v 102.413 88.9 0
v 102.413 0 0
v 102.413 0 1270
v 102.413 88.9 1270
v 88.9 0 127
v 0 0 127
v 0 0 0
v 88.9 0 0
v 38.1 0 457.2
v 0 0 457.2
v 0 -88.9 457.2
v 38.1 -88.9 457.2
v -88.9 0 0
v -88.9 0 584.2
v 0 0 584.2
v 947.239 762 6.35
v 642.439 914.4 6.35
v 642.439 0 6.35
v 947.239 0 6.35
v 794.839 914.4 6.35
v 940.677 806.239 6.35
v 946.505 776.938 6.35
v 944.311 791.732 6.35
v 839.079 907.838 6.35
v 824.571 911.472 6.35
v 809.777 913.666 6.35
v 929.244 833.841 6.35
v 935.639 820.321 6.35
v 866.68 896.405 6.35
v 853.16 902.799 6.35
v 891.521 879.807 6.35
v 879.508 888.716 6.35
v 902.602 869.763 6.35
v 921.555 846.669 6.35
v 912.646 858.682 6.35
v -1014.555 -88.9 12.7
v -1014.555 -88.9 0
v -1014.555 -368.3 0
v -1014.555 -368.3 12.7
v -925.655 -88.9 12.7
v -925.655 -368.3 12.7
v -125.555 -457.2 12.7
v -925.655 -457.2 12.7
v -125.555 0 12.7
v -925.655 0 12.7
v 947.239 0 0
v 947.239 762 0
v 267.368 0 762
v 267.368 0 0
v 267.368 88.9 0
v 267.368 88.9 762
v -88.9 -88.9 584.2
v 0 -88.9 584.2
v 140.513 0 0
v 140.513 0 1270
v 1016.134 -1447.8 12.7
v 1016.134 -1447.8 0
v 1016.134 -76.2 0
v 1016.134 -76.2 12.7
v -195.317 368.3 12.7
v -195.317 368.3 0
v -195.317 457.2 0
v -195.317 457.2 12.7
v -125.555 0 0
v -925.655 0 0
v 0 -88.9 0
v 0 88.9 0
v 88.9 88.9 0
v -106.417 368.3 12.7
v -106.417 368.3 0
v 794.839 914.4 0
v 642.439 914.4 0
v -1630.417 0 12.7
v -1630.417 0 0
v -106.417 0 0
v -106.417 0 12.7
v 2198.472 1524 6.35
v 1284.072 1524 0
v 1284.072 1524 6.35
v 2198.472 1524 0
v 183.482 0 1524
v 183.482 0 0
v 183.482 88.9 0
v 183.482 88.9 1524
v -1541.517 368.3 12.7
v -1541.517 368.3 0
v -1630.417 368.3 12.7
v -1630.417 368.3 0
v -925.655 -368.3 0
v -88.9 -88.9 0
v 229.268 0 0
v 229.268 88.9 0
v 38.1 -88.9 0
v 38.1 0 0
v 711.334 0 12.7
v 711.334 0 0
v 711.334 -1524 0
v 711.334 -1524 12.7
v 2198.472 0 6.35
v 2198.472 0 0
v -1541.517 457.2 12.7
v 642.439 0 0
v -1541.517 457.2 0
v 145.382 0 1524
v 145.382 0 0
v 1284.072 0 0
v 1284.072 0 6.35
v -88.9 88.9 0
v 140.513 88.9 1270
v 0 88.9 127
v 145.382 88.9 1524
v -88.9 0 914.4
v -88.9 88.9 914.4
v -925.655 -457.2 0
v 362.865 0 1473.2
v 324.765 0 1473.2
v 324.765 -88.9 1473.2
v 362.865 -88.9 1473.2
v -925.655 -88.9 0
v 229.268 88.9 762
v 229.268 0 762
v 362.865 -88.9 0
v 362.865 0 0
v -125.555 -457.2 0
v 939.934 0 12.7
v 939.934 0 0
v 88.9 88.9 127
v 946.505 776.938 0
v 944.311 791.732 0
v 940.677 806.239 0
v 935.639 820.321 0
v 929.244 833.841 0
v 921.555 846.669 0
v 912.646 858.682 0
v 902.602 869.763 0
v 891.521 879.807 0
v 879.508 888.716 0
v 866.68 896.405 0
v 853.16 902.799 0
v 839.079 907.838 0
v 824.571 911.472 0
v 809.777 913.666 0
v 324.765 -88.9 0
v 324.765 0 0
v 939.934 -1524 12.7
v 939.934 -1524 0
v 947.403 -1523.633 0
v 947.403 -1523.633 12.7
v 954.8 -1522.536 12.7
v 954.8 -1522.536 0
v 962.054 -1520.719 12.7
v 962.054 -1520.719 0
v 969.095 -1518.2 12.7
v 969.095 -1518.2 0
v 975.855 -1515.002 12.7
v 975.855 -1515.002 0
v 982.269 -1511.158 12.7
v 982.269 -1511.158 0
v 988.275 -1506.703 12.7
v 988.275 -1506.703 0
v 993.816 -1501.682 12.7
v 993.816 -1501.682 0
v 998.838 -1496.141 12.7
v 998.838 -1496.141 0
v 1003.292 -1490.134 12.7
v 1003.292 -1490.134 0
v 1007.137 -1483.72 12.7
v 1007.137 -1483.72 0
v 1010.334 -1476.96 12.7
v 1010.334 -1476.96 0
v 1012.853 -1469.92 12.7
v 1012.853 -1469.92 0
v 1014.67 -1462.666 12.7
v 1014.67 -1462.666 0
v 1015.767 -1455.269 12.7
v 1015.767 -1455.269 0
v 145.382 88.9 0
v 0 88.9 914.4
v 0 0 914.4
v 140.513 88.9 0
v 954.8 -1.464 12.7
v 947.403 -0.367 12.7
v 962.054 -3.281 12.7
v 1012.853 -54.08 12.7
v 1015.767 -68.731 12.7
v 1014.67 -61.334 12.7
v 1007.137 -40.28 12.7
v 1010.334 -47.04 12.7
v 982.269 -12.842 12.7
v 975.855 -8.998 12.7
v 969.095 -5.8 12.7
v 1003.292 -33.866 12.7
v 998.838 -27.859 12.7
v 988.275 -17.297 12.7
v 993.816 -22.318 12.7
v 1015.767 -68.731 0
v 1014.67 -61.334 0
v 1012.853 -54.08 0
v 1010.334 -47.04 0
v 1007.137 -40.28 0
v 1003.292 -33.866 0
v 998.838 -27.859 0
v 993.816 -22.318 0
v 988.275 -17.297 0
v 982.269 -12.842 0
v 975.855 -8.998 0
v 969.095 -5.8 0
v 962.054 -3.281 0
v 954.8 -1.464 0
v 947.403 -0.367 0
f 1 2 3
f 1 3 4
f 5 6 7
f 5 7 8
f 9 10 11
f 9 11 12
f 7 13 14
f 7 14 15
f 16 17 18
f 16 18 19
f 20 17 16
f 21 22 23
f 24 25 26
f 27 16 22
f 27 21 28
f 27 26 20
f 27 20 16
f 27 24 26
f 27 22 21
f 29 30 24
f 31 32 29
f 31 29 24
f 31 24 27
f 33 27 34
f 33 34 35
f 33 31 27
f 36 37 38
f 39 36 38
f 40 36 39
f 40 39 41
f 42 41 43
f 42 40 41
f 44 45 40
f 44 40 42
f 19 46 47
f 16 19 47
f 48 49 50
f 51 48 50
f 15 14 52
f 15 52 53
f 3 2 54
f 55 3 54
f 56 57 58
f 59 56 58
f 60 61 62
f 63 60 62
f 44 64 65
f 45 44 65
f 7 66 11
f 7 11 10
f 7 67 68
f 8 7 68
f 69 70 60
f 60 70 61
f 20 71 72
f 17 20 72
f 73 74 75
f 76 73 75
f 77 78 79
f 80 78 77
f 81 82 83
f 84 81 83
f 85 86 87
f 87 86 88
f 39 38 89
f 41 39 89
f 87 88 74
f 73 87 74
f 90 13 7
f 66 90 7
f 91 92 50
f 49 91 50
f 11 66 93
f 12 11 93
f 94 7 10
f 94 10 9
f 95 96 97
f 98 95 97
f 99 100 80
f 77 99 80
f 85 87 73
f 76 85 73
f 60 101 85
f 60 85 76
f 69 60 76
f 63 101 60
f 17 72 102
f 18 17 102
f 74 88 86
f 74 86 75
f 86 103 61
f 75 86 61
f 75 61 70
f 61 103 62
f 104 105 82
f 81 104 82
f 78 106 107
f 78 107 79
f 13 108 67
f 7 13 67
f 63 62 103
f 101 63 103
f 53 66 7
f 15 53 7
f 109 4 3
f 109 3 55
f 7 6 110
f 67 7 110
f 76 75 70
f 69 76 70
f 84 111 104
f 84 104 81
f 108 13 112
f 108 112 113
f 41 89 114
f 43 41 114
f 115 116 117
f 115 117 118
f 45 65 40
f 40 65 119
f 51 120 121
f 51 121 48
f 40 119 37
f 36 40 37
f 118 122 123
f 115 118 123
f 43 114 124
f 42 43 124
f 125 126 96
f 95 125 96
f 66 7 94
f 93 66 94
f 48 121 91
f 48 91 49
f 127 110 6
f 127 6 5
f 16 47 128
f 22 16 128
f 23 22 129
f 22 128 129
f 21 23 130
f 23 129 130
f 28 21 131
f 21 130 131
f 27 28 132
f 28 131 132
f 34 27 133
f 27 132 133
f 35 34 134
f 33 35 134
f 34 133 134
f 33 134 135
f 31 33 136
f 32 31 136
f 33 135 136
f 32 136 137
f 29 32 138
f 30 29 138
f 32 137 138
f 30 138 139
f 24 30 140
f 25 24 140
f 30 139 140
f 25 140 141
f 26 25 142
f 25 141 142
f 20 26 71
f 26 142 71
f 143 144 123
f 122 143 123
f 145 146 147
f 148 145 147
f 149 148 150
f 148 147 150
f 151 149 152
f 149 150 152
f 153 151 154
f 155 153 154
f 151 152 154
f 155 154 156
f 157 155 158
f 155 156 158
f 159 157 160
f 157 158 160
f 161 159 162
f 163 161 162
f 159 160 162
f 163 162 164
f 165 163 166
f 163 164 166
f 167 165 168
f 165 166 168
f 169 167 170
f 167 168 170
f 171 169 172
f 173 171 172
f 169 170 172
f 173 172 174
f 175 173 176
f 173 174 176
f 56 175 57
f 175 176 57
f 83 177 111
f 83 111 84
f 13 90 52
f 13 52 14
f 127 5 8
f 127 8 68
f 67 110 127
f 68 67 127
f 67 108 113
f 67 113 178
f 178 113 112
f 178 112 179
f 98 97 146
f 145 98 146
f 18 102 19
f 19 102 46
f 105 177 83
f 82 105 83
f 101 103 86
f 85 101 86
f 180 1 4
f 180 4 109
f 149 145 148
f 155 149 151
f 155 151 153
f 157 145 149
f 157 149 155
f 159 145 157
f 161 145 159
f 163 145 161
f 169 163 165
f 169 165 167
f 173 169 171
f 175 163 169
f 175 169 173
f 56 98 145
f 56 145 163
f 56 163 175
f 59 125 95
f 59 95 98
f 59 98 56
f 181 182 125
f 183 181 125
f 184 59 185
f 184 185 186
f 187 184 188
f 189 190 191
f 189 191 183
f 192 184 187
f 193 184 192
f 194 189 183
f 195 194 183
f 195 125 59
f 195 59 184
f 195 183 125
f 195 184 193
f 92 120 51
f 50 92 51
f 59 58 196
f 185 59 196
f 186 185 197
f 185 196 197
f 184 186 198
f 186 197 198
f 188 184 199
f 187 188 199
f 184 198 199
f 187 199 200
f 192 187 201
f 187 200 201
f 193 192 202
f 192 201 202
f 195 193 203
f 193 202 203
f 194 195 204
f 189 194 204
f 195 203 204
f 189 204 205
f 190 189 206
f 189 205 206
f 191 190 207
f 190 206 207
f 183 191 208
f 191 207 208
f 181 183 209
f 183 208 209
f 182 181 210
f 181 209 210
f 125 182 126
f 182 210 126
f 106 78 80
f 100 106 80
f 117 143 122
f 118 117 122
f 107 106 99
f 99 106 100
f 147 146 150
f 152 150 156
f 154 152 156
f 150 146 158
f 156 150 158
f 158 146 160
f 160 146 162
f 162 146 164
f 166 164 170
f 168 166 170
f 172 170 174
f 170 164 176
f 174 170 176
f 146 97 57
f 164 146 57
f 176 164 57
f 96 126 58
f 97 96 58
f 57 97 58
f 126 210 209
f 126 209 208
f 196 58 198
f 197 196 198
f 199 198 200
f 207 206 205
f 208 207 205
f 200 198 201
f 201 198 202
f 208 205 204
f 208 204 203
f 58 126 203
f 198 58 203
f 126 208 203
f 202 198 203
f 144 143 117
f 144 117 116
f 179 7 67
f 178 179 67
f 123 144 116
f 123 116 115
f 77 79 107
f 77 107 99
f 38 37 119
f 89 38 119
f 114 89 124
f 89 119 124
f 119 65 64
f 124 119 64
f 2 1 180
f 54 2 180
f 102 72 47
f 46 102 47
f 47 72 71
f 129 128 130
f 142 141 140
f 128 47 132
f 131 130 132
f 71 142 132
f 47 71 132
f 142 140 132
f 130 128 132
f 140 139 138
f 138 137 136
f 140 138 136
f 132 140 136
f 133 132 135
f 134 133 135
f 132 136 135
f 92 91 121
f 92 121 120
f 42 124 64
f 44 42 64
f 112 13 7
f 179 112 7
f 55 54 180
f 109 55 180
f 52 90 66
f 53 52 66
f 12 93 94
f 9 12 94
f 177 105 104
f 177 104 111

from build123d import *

# Parameters (mm, degrees)
F0_W      = 38.1
F0_H      = 88.9
F2_DEPTH  = 457.2
F1_W      = 88.9
F1_H      = 88.9
F3_DEPTH  = 914.4
F4_W      = 88.9
F4_H      = 88.9
F6_DEPTH  = 127
F5_W      = 88.9
F5_H      = 88.9
F7_DEPTH  = 584.2
F8_W      = 38.1
F8_H      = 88.9
F9_DEPTH  = 1270
F10_W     = 38.1
F10_H     = 88.9
F11_DEPTH = 1524
F12_W     = 38.1
F12_H     = 88.9
F13_DEPTH = 762
F15_DEPTH = 12.7
F17_DEPTH = 12.7
F19_DEPTH = 12.7
F21_DEPTH = 6.35
F22_W     = 914.4
F22_H     = 1524
F23_DEPTH = 6.35
F24_W     = 38.1
F24_H     = 88.9
F25_DEPTH = 1473.2


with BuildPart() as f2:
    # F0 (on Top) → F2 (new body)
    with BuildSketch(Plane.XY):
        with Locations((19.05, -44.45)):
            Rectangle(F0_W, F0_H)
    extrude(amount=F2_DEPTH)


with BuildPart() as f3:
    # F1 (on Top) → F3 (new body)
    with BuildSketch(Plane.XY):
        with Locations((-44.45, 44.45)):
            Rectangle(F1_W, F1_H)
    extrude(amount=F3_DEPTH)


with BuildPart() as f6:
    # F4 (on Top) → F6 (new body)
    with BuildSketch(Plane.XY):
        with Locations((44.45, 44.45)):
            Rectangle(F4_W, F4_H)
    extrude(amount=F6_DEPTH)


with BuildPart() as f7:
    # F5 (on Top) → F7 (new body)
    with BuildSketch(Plane.XY):
        with Locations((-44.45, -44.45)):
            Rectangle(F5_W, F5_H)
    extrude(amount=F7_DEPTH)


with BuildPart() as f9:
    # F8 (on Top) → F9 (new body)
    with BuildSketch(Plane.XY):
        with Locations((121.462798, 44.45)):
            Rectangle(F8_W, F8_H)
    extrude(amount=F9_DEPTH)


with BuildPart() as f11:
    # F10 (on Top) → F11 (new body)
    with BuildSketch(Plane.XY):
        with Locations((164.431525, 44.45)):
            Rectangle(F10_W, F10_H)
    extrude(amount=F11_DEPTH)


with BuildPart() as f13:
    # F12 (on Top) → F13 (new body)
    with BuildSketch(Plane.XY):
        with Locations((248.318435, 44.45)):
            Rectangle(F12_W, F12_H)
    extrude(amount=F13_DEPTH)


with BuildPart() as f15:
    # F14 (on Top) → F15 (new body)
    with BuildSketch(Plane.XY):
        Polygon((-1630.416789, 0), (-106.416789, 0), (-106.416789, 368.3), (-195.316789, 368.3), (-195.316789, 457.2), (-1541.516789, 457.2), (-1541.516789, 368.3), (-1630.416789, 368.3), align=None)
    extrude(amount=F15_DEPTH)


with BuildPart() as f17:
    # F16 (on Top) → F17 (new body)
    with BuildSketch(Plane.XY):
        Polygon((-125.555, -457.2), (-125.555, 0), (-925.655, 0), (-925.655, -88.9), (-1014.555, -88.9), (-1014.555, -368.3), (-925.655, -368.3), (-925.655, -457.2), align=None)
    extrude(amount=F17_DEPTH)


with BuildPart() as f19:
    # F18 (on Top) → F19 (new body)
    with BuildSketch(Plane.XY):
        with BuildLine():
            ThreePointArc((1016.134128, -76.2), (993.815665, -22.318463), (939.934128, 0))
            Line((939.934128, 0), (711.334128, 0))
            Line((711.334128, 0), (711.334128, -1524))
            Line((711.334128, -1524), (939.934128, -1524))
            ThreePointArc((939.934128, -1524), (993.815665, -1501.681537), (1016.134128, -1447.8))
            Line((1016.134128, -1447.8), (1016.134128, -76.2))
        make_face()
    extrude(amount=F19_DEPTH)


with BuildPart() as f21:
    # F20 (on Top) → F21 (new body)
    with BuildSketch(Plane.XY):
        with BuildLine():
            Line((642.439276, 914.4), (642.439276, 0))
            Line((642.439276, 0), (947.239276, 0))
            Line((947.239276, 0), (947.239276, 762))
            ThreePointArc((947.239276, 762), (902.602349, 869.763073), (794.839276, 914.4))
            Line((794.839276, 914.4), (642.439276, 914.4))
        make_face()
    extrude(amount=F21_DEPTH)


with BuildPart() as f23:
    # F22 (on Top) → F23 (new body)
    with BuildSketch(Plane.XY):
        with Locations((1741.271867, 762)):
            Rectangle(F22_W, F22_H)
    extrude(amount=F23_DEPTH)


with BuildPart() as f25:
    # F24 (on Top) → F25 (new body)
    with BuildSketch(Plane.XY):
        with Locations((343.815442, -44.45)):
            Rectangle(F24_W, F24_H)
    extrude(amount=F25_DEPTH)


solid = Compound([f2.part, f3.part, f6.part, f7.part, f9.part, f11.part, f13.part, f15.part, f17.part, f19.part, f21.part, f23.part, f25.part])
